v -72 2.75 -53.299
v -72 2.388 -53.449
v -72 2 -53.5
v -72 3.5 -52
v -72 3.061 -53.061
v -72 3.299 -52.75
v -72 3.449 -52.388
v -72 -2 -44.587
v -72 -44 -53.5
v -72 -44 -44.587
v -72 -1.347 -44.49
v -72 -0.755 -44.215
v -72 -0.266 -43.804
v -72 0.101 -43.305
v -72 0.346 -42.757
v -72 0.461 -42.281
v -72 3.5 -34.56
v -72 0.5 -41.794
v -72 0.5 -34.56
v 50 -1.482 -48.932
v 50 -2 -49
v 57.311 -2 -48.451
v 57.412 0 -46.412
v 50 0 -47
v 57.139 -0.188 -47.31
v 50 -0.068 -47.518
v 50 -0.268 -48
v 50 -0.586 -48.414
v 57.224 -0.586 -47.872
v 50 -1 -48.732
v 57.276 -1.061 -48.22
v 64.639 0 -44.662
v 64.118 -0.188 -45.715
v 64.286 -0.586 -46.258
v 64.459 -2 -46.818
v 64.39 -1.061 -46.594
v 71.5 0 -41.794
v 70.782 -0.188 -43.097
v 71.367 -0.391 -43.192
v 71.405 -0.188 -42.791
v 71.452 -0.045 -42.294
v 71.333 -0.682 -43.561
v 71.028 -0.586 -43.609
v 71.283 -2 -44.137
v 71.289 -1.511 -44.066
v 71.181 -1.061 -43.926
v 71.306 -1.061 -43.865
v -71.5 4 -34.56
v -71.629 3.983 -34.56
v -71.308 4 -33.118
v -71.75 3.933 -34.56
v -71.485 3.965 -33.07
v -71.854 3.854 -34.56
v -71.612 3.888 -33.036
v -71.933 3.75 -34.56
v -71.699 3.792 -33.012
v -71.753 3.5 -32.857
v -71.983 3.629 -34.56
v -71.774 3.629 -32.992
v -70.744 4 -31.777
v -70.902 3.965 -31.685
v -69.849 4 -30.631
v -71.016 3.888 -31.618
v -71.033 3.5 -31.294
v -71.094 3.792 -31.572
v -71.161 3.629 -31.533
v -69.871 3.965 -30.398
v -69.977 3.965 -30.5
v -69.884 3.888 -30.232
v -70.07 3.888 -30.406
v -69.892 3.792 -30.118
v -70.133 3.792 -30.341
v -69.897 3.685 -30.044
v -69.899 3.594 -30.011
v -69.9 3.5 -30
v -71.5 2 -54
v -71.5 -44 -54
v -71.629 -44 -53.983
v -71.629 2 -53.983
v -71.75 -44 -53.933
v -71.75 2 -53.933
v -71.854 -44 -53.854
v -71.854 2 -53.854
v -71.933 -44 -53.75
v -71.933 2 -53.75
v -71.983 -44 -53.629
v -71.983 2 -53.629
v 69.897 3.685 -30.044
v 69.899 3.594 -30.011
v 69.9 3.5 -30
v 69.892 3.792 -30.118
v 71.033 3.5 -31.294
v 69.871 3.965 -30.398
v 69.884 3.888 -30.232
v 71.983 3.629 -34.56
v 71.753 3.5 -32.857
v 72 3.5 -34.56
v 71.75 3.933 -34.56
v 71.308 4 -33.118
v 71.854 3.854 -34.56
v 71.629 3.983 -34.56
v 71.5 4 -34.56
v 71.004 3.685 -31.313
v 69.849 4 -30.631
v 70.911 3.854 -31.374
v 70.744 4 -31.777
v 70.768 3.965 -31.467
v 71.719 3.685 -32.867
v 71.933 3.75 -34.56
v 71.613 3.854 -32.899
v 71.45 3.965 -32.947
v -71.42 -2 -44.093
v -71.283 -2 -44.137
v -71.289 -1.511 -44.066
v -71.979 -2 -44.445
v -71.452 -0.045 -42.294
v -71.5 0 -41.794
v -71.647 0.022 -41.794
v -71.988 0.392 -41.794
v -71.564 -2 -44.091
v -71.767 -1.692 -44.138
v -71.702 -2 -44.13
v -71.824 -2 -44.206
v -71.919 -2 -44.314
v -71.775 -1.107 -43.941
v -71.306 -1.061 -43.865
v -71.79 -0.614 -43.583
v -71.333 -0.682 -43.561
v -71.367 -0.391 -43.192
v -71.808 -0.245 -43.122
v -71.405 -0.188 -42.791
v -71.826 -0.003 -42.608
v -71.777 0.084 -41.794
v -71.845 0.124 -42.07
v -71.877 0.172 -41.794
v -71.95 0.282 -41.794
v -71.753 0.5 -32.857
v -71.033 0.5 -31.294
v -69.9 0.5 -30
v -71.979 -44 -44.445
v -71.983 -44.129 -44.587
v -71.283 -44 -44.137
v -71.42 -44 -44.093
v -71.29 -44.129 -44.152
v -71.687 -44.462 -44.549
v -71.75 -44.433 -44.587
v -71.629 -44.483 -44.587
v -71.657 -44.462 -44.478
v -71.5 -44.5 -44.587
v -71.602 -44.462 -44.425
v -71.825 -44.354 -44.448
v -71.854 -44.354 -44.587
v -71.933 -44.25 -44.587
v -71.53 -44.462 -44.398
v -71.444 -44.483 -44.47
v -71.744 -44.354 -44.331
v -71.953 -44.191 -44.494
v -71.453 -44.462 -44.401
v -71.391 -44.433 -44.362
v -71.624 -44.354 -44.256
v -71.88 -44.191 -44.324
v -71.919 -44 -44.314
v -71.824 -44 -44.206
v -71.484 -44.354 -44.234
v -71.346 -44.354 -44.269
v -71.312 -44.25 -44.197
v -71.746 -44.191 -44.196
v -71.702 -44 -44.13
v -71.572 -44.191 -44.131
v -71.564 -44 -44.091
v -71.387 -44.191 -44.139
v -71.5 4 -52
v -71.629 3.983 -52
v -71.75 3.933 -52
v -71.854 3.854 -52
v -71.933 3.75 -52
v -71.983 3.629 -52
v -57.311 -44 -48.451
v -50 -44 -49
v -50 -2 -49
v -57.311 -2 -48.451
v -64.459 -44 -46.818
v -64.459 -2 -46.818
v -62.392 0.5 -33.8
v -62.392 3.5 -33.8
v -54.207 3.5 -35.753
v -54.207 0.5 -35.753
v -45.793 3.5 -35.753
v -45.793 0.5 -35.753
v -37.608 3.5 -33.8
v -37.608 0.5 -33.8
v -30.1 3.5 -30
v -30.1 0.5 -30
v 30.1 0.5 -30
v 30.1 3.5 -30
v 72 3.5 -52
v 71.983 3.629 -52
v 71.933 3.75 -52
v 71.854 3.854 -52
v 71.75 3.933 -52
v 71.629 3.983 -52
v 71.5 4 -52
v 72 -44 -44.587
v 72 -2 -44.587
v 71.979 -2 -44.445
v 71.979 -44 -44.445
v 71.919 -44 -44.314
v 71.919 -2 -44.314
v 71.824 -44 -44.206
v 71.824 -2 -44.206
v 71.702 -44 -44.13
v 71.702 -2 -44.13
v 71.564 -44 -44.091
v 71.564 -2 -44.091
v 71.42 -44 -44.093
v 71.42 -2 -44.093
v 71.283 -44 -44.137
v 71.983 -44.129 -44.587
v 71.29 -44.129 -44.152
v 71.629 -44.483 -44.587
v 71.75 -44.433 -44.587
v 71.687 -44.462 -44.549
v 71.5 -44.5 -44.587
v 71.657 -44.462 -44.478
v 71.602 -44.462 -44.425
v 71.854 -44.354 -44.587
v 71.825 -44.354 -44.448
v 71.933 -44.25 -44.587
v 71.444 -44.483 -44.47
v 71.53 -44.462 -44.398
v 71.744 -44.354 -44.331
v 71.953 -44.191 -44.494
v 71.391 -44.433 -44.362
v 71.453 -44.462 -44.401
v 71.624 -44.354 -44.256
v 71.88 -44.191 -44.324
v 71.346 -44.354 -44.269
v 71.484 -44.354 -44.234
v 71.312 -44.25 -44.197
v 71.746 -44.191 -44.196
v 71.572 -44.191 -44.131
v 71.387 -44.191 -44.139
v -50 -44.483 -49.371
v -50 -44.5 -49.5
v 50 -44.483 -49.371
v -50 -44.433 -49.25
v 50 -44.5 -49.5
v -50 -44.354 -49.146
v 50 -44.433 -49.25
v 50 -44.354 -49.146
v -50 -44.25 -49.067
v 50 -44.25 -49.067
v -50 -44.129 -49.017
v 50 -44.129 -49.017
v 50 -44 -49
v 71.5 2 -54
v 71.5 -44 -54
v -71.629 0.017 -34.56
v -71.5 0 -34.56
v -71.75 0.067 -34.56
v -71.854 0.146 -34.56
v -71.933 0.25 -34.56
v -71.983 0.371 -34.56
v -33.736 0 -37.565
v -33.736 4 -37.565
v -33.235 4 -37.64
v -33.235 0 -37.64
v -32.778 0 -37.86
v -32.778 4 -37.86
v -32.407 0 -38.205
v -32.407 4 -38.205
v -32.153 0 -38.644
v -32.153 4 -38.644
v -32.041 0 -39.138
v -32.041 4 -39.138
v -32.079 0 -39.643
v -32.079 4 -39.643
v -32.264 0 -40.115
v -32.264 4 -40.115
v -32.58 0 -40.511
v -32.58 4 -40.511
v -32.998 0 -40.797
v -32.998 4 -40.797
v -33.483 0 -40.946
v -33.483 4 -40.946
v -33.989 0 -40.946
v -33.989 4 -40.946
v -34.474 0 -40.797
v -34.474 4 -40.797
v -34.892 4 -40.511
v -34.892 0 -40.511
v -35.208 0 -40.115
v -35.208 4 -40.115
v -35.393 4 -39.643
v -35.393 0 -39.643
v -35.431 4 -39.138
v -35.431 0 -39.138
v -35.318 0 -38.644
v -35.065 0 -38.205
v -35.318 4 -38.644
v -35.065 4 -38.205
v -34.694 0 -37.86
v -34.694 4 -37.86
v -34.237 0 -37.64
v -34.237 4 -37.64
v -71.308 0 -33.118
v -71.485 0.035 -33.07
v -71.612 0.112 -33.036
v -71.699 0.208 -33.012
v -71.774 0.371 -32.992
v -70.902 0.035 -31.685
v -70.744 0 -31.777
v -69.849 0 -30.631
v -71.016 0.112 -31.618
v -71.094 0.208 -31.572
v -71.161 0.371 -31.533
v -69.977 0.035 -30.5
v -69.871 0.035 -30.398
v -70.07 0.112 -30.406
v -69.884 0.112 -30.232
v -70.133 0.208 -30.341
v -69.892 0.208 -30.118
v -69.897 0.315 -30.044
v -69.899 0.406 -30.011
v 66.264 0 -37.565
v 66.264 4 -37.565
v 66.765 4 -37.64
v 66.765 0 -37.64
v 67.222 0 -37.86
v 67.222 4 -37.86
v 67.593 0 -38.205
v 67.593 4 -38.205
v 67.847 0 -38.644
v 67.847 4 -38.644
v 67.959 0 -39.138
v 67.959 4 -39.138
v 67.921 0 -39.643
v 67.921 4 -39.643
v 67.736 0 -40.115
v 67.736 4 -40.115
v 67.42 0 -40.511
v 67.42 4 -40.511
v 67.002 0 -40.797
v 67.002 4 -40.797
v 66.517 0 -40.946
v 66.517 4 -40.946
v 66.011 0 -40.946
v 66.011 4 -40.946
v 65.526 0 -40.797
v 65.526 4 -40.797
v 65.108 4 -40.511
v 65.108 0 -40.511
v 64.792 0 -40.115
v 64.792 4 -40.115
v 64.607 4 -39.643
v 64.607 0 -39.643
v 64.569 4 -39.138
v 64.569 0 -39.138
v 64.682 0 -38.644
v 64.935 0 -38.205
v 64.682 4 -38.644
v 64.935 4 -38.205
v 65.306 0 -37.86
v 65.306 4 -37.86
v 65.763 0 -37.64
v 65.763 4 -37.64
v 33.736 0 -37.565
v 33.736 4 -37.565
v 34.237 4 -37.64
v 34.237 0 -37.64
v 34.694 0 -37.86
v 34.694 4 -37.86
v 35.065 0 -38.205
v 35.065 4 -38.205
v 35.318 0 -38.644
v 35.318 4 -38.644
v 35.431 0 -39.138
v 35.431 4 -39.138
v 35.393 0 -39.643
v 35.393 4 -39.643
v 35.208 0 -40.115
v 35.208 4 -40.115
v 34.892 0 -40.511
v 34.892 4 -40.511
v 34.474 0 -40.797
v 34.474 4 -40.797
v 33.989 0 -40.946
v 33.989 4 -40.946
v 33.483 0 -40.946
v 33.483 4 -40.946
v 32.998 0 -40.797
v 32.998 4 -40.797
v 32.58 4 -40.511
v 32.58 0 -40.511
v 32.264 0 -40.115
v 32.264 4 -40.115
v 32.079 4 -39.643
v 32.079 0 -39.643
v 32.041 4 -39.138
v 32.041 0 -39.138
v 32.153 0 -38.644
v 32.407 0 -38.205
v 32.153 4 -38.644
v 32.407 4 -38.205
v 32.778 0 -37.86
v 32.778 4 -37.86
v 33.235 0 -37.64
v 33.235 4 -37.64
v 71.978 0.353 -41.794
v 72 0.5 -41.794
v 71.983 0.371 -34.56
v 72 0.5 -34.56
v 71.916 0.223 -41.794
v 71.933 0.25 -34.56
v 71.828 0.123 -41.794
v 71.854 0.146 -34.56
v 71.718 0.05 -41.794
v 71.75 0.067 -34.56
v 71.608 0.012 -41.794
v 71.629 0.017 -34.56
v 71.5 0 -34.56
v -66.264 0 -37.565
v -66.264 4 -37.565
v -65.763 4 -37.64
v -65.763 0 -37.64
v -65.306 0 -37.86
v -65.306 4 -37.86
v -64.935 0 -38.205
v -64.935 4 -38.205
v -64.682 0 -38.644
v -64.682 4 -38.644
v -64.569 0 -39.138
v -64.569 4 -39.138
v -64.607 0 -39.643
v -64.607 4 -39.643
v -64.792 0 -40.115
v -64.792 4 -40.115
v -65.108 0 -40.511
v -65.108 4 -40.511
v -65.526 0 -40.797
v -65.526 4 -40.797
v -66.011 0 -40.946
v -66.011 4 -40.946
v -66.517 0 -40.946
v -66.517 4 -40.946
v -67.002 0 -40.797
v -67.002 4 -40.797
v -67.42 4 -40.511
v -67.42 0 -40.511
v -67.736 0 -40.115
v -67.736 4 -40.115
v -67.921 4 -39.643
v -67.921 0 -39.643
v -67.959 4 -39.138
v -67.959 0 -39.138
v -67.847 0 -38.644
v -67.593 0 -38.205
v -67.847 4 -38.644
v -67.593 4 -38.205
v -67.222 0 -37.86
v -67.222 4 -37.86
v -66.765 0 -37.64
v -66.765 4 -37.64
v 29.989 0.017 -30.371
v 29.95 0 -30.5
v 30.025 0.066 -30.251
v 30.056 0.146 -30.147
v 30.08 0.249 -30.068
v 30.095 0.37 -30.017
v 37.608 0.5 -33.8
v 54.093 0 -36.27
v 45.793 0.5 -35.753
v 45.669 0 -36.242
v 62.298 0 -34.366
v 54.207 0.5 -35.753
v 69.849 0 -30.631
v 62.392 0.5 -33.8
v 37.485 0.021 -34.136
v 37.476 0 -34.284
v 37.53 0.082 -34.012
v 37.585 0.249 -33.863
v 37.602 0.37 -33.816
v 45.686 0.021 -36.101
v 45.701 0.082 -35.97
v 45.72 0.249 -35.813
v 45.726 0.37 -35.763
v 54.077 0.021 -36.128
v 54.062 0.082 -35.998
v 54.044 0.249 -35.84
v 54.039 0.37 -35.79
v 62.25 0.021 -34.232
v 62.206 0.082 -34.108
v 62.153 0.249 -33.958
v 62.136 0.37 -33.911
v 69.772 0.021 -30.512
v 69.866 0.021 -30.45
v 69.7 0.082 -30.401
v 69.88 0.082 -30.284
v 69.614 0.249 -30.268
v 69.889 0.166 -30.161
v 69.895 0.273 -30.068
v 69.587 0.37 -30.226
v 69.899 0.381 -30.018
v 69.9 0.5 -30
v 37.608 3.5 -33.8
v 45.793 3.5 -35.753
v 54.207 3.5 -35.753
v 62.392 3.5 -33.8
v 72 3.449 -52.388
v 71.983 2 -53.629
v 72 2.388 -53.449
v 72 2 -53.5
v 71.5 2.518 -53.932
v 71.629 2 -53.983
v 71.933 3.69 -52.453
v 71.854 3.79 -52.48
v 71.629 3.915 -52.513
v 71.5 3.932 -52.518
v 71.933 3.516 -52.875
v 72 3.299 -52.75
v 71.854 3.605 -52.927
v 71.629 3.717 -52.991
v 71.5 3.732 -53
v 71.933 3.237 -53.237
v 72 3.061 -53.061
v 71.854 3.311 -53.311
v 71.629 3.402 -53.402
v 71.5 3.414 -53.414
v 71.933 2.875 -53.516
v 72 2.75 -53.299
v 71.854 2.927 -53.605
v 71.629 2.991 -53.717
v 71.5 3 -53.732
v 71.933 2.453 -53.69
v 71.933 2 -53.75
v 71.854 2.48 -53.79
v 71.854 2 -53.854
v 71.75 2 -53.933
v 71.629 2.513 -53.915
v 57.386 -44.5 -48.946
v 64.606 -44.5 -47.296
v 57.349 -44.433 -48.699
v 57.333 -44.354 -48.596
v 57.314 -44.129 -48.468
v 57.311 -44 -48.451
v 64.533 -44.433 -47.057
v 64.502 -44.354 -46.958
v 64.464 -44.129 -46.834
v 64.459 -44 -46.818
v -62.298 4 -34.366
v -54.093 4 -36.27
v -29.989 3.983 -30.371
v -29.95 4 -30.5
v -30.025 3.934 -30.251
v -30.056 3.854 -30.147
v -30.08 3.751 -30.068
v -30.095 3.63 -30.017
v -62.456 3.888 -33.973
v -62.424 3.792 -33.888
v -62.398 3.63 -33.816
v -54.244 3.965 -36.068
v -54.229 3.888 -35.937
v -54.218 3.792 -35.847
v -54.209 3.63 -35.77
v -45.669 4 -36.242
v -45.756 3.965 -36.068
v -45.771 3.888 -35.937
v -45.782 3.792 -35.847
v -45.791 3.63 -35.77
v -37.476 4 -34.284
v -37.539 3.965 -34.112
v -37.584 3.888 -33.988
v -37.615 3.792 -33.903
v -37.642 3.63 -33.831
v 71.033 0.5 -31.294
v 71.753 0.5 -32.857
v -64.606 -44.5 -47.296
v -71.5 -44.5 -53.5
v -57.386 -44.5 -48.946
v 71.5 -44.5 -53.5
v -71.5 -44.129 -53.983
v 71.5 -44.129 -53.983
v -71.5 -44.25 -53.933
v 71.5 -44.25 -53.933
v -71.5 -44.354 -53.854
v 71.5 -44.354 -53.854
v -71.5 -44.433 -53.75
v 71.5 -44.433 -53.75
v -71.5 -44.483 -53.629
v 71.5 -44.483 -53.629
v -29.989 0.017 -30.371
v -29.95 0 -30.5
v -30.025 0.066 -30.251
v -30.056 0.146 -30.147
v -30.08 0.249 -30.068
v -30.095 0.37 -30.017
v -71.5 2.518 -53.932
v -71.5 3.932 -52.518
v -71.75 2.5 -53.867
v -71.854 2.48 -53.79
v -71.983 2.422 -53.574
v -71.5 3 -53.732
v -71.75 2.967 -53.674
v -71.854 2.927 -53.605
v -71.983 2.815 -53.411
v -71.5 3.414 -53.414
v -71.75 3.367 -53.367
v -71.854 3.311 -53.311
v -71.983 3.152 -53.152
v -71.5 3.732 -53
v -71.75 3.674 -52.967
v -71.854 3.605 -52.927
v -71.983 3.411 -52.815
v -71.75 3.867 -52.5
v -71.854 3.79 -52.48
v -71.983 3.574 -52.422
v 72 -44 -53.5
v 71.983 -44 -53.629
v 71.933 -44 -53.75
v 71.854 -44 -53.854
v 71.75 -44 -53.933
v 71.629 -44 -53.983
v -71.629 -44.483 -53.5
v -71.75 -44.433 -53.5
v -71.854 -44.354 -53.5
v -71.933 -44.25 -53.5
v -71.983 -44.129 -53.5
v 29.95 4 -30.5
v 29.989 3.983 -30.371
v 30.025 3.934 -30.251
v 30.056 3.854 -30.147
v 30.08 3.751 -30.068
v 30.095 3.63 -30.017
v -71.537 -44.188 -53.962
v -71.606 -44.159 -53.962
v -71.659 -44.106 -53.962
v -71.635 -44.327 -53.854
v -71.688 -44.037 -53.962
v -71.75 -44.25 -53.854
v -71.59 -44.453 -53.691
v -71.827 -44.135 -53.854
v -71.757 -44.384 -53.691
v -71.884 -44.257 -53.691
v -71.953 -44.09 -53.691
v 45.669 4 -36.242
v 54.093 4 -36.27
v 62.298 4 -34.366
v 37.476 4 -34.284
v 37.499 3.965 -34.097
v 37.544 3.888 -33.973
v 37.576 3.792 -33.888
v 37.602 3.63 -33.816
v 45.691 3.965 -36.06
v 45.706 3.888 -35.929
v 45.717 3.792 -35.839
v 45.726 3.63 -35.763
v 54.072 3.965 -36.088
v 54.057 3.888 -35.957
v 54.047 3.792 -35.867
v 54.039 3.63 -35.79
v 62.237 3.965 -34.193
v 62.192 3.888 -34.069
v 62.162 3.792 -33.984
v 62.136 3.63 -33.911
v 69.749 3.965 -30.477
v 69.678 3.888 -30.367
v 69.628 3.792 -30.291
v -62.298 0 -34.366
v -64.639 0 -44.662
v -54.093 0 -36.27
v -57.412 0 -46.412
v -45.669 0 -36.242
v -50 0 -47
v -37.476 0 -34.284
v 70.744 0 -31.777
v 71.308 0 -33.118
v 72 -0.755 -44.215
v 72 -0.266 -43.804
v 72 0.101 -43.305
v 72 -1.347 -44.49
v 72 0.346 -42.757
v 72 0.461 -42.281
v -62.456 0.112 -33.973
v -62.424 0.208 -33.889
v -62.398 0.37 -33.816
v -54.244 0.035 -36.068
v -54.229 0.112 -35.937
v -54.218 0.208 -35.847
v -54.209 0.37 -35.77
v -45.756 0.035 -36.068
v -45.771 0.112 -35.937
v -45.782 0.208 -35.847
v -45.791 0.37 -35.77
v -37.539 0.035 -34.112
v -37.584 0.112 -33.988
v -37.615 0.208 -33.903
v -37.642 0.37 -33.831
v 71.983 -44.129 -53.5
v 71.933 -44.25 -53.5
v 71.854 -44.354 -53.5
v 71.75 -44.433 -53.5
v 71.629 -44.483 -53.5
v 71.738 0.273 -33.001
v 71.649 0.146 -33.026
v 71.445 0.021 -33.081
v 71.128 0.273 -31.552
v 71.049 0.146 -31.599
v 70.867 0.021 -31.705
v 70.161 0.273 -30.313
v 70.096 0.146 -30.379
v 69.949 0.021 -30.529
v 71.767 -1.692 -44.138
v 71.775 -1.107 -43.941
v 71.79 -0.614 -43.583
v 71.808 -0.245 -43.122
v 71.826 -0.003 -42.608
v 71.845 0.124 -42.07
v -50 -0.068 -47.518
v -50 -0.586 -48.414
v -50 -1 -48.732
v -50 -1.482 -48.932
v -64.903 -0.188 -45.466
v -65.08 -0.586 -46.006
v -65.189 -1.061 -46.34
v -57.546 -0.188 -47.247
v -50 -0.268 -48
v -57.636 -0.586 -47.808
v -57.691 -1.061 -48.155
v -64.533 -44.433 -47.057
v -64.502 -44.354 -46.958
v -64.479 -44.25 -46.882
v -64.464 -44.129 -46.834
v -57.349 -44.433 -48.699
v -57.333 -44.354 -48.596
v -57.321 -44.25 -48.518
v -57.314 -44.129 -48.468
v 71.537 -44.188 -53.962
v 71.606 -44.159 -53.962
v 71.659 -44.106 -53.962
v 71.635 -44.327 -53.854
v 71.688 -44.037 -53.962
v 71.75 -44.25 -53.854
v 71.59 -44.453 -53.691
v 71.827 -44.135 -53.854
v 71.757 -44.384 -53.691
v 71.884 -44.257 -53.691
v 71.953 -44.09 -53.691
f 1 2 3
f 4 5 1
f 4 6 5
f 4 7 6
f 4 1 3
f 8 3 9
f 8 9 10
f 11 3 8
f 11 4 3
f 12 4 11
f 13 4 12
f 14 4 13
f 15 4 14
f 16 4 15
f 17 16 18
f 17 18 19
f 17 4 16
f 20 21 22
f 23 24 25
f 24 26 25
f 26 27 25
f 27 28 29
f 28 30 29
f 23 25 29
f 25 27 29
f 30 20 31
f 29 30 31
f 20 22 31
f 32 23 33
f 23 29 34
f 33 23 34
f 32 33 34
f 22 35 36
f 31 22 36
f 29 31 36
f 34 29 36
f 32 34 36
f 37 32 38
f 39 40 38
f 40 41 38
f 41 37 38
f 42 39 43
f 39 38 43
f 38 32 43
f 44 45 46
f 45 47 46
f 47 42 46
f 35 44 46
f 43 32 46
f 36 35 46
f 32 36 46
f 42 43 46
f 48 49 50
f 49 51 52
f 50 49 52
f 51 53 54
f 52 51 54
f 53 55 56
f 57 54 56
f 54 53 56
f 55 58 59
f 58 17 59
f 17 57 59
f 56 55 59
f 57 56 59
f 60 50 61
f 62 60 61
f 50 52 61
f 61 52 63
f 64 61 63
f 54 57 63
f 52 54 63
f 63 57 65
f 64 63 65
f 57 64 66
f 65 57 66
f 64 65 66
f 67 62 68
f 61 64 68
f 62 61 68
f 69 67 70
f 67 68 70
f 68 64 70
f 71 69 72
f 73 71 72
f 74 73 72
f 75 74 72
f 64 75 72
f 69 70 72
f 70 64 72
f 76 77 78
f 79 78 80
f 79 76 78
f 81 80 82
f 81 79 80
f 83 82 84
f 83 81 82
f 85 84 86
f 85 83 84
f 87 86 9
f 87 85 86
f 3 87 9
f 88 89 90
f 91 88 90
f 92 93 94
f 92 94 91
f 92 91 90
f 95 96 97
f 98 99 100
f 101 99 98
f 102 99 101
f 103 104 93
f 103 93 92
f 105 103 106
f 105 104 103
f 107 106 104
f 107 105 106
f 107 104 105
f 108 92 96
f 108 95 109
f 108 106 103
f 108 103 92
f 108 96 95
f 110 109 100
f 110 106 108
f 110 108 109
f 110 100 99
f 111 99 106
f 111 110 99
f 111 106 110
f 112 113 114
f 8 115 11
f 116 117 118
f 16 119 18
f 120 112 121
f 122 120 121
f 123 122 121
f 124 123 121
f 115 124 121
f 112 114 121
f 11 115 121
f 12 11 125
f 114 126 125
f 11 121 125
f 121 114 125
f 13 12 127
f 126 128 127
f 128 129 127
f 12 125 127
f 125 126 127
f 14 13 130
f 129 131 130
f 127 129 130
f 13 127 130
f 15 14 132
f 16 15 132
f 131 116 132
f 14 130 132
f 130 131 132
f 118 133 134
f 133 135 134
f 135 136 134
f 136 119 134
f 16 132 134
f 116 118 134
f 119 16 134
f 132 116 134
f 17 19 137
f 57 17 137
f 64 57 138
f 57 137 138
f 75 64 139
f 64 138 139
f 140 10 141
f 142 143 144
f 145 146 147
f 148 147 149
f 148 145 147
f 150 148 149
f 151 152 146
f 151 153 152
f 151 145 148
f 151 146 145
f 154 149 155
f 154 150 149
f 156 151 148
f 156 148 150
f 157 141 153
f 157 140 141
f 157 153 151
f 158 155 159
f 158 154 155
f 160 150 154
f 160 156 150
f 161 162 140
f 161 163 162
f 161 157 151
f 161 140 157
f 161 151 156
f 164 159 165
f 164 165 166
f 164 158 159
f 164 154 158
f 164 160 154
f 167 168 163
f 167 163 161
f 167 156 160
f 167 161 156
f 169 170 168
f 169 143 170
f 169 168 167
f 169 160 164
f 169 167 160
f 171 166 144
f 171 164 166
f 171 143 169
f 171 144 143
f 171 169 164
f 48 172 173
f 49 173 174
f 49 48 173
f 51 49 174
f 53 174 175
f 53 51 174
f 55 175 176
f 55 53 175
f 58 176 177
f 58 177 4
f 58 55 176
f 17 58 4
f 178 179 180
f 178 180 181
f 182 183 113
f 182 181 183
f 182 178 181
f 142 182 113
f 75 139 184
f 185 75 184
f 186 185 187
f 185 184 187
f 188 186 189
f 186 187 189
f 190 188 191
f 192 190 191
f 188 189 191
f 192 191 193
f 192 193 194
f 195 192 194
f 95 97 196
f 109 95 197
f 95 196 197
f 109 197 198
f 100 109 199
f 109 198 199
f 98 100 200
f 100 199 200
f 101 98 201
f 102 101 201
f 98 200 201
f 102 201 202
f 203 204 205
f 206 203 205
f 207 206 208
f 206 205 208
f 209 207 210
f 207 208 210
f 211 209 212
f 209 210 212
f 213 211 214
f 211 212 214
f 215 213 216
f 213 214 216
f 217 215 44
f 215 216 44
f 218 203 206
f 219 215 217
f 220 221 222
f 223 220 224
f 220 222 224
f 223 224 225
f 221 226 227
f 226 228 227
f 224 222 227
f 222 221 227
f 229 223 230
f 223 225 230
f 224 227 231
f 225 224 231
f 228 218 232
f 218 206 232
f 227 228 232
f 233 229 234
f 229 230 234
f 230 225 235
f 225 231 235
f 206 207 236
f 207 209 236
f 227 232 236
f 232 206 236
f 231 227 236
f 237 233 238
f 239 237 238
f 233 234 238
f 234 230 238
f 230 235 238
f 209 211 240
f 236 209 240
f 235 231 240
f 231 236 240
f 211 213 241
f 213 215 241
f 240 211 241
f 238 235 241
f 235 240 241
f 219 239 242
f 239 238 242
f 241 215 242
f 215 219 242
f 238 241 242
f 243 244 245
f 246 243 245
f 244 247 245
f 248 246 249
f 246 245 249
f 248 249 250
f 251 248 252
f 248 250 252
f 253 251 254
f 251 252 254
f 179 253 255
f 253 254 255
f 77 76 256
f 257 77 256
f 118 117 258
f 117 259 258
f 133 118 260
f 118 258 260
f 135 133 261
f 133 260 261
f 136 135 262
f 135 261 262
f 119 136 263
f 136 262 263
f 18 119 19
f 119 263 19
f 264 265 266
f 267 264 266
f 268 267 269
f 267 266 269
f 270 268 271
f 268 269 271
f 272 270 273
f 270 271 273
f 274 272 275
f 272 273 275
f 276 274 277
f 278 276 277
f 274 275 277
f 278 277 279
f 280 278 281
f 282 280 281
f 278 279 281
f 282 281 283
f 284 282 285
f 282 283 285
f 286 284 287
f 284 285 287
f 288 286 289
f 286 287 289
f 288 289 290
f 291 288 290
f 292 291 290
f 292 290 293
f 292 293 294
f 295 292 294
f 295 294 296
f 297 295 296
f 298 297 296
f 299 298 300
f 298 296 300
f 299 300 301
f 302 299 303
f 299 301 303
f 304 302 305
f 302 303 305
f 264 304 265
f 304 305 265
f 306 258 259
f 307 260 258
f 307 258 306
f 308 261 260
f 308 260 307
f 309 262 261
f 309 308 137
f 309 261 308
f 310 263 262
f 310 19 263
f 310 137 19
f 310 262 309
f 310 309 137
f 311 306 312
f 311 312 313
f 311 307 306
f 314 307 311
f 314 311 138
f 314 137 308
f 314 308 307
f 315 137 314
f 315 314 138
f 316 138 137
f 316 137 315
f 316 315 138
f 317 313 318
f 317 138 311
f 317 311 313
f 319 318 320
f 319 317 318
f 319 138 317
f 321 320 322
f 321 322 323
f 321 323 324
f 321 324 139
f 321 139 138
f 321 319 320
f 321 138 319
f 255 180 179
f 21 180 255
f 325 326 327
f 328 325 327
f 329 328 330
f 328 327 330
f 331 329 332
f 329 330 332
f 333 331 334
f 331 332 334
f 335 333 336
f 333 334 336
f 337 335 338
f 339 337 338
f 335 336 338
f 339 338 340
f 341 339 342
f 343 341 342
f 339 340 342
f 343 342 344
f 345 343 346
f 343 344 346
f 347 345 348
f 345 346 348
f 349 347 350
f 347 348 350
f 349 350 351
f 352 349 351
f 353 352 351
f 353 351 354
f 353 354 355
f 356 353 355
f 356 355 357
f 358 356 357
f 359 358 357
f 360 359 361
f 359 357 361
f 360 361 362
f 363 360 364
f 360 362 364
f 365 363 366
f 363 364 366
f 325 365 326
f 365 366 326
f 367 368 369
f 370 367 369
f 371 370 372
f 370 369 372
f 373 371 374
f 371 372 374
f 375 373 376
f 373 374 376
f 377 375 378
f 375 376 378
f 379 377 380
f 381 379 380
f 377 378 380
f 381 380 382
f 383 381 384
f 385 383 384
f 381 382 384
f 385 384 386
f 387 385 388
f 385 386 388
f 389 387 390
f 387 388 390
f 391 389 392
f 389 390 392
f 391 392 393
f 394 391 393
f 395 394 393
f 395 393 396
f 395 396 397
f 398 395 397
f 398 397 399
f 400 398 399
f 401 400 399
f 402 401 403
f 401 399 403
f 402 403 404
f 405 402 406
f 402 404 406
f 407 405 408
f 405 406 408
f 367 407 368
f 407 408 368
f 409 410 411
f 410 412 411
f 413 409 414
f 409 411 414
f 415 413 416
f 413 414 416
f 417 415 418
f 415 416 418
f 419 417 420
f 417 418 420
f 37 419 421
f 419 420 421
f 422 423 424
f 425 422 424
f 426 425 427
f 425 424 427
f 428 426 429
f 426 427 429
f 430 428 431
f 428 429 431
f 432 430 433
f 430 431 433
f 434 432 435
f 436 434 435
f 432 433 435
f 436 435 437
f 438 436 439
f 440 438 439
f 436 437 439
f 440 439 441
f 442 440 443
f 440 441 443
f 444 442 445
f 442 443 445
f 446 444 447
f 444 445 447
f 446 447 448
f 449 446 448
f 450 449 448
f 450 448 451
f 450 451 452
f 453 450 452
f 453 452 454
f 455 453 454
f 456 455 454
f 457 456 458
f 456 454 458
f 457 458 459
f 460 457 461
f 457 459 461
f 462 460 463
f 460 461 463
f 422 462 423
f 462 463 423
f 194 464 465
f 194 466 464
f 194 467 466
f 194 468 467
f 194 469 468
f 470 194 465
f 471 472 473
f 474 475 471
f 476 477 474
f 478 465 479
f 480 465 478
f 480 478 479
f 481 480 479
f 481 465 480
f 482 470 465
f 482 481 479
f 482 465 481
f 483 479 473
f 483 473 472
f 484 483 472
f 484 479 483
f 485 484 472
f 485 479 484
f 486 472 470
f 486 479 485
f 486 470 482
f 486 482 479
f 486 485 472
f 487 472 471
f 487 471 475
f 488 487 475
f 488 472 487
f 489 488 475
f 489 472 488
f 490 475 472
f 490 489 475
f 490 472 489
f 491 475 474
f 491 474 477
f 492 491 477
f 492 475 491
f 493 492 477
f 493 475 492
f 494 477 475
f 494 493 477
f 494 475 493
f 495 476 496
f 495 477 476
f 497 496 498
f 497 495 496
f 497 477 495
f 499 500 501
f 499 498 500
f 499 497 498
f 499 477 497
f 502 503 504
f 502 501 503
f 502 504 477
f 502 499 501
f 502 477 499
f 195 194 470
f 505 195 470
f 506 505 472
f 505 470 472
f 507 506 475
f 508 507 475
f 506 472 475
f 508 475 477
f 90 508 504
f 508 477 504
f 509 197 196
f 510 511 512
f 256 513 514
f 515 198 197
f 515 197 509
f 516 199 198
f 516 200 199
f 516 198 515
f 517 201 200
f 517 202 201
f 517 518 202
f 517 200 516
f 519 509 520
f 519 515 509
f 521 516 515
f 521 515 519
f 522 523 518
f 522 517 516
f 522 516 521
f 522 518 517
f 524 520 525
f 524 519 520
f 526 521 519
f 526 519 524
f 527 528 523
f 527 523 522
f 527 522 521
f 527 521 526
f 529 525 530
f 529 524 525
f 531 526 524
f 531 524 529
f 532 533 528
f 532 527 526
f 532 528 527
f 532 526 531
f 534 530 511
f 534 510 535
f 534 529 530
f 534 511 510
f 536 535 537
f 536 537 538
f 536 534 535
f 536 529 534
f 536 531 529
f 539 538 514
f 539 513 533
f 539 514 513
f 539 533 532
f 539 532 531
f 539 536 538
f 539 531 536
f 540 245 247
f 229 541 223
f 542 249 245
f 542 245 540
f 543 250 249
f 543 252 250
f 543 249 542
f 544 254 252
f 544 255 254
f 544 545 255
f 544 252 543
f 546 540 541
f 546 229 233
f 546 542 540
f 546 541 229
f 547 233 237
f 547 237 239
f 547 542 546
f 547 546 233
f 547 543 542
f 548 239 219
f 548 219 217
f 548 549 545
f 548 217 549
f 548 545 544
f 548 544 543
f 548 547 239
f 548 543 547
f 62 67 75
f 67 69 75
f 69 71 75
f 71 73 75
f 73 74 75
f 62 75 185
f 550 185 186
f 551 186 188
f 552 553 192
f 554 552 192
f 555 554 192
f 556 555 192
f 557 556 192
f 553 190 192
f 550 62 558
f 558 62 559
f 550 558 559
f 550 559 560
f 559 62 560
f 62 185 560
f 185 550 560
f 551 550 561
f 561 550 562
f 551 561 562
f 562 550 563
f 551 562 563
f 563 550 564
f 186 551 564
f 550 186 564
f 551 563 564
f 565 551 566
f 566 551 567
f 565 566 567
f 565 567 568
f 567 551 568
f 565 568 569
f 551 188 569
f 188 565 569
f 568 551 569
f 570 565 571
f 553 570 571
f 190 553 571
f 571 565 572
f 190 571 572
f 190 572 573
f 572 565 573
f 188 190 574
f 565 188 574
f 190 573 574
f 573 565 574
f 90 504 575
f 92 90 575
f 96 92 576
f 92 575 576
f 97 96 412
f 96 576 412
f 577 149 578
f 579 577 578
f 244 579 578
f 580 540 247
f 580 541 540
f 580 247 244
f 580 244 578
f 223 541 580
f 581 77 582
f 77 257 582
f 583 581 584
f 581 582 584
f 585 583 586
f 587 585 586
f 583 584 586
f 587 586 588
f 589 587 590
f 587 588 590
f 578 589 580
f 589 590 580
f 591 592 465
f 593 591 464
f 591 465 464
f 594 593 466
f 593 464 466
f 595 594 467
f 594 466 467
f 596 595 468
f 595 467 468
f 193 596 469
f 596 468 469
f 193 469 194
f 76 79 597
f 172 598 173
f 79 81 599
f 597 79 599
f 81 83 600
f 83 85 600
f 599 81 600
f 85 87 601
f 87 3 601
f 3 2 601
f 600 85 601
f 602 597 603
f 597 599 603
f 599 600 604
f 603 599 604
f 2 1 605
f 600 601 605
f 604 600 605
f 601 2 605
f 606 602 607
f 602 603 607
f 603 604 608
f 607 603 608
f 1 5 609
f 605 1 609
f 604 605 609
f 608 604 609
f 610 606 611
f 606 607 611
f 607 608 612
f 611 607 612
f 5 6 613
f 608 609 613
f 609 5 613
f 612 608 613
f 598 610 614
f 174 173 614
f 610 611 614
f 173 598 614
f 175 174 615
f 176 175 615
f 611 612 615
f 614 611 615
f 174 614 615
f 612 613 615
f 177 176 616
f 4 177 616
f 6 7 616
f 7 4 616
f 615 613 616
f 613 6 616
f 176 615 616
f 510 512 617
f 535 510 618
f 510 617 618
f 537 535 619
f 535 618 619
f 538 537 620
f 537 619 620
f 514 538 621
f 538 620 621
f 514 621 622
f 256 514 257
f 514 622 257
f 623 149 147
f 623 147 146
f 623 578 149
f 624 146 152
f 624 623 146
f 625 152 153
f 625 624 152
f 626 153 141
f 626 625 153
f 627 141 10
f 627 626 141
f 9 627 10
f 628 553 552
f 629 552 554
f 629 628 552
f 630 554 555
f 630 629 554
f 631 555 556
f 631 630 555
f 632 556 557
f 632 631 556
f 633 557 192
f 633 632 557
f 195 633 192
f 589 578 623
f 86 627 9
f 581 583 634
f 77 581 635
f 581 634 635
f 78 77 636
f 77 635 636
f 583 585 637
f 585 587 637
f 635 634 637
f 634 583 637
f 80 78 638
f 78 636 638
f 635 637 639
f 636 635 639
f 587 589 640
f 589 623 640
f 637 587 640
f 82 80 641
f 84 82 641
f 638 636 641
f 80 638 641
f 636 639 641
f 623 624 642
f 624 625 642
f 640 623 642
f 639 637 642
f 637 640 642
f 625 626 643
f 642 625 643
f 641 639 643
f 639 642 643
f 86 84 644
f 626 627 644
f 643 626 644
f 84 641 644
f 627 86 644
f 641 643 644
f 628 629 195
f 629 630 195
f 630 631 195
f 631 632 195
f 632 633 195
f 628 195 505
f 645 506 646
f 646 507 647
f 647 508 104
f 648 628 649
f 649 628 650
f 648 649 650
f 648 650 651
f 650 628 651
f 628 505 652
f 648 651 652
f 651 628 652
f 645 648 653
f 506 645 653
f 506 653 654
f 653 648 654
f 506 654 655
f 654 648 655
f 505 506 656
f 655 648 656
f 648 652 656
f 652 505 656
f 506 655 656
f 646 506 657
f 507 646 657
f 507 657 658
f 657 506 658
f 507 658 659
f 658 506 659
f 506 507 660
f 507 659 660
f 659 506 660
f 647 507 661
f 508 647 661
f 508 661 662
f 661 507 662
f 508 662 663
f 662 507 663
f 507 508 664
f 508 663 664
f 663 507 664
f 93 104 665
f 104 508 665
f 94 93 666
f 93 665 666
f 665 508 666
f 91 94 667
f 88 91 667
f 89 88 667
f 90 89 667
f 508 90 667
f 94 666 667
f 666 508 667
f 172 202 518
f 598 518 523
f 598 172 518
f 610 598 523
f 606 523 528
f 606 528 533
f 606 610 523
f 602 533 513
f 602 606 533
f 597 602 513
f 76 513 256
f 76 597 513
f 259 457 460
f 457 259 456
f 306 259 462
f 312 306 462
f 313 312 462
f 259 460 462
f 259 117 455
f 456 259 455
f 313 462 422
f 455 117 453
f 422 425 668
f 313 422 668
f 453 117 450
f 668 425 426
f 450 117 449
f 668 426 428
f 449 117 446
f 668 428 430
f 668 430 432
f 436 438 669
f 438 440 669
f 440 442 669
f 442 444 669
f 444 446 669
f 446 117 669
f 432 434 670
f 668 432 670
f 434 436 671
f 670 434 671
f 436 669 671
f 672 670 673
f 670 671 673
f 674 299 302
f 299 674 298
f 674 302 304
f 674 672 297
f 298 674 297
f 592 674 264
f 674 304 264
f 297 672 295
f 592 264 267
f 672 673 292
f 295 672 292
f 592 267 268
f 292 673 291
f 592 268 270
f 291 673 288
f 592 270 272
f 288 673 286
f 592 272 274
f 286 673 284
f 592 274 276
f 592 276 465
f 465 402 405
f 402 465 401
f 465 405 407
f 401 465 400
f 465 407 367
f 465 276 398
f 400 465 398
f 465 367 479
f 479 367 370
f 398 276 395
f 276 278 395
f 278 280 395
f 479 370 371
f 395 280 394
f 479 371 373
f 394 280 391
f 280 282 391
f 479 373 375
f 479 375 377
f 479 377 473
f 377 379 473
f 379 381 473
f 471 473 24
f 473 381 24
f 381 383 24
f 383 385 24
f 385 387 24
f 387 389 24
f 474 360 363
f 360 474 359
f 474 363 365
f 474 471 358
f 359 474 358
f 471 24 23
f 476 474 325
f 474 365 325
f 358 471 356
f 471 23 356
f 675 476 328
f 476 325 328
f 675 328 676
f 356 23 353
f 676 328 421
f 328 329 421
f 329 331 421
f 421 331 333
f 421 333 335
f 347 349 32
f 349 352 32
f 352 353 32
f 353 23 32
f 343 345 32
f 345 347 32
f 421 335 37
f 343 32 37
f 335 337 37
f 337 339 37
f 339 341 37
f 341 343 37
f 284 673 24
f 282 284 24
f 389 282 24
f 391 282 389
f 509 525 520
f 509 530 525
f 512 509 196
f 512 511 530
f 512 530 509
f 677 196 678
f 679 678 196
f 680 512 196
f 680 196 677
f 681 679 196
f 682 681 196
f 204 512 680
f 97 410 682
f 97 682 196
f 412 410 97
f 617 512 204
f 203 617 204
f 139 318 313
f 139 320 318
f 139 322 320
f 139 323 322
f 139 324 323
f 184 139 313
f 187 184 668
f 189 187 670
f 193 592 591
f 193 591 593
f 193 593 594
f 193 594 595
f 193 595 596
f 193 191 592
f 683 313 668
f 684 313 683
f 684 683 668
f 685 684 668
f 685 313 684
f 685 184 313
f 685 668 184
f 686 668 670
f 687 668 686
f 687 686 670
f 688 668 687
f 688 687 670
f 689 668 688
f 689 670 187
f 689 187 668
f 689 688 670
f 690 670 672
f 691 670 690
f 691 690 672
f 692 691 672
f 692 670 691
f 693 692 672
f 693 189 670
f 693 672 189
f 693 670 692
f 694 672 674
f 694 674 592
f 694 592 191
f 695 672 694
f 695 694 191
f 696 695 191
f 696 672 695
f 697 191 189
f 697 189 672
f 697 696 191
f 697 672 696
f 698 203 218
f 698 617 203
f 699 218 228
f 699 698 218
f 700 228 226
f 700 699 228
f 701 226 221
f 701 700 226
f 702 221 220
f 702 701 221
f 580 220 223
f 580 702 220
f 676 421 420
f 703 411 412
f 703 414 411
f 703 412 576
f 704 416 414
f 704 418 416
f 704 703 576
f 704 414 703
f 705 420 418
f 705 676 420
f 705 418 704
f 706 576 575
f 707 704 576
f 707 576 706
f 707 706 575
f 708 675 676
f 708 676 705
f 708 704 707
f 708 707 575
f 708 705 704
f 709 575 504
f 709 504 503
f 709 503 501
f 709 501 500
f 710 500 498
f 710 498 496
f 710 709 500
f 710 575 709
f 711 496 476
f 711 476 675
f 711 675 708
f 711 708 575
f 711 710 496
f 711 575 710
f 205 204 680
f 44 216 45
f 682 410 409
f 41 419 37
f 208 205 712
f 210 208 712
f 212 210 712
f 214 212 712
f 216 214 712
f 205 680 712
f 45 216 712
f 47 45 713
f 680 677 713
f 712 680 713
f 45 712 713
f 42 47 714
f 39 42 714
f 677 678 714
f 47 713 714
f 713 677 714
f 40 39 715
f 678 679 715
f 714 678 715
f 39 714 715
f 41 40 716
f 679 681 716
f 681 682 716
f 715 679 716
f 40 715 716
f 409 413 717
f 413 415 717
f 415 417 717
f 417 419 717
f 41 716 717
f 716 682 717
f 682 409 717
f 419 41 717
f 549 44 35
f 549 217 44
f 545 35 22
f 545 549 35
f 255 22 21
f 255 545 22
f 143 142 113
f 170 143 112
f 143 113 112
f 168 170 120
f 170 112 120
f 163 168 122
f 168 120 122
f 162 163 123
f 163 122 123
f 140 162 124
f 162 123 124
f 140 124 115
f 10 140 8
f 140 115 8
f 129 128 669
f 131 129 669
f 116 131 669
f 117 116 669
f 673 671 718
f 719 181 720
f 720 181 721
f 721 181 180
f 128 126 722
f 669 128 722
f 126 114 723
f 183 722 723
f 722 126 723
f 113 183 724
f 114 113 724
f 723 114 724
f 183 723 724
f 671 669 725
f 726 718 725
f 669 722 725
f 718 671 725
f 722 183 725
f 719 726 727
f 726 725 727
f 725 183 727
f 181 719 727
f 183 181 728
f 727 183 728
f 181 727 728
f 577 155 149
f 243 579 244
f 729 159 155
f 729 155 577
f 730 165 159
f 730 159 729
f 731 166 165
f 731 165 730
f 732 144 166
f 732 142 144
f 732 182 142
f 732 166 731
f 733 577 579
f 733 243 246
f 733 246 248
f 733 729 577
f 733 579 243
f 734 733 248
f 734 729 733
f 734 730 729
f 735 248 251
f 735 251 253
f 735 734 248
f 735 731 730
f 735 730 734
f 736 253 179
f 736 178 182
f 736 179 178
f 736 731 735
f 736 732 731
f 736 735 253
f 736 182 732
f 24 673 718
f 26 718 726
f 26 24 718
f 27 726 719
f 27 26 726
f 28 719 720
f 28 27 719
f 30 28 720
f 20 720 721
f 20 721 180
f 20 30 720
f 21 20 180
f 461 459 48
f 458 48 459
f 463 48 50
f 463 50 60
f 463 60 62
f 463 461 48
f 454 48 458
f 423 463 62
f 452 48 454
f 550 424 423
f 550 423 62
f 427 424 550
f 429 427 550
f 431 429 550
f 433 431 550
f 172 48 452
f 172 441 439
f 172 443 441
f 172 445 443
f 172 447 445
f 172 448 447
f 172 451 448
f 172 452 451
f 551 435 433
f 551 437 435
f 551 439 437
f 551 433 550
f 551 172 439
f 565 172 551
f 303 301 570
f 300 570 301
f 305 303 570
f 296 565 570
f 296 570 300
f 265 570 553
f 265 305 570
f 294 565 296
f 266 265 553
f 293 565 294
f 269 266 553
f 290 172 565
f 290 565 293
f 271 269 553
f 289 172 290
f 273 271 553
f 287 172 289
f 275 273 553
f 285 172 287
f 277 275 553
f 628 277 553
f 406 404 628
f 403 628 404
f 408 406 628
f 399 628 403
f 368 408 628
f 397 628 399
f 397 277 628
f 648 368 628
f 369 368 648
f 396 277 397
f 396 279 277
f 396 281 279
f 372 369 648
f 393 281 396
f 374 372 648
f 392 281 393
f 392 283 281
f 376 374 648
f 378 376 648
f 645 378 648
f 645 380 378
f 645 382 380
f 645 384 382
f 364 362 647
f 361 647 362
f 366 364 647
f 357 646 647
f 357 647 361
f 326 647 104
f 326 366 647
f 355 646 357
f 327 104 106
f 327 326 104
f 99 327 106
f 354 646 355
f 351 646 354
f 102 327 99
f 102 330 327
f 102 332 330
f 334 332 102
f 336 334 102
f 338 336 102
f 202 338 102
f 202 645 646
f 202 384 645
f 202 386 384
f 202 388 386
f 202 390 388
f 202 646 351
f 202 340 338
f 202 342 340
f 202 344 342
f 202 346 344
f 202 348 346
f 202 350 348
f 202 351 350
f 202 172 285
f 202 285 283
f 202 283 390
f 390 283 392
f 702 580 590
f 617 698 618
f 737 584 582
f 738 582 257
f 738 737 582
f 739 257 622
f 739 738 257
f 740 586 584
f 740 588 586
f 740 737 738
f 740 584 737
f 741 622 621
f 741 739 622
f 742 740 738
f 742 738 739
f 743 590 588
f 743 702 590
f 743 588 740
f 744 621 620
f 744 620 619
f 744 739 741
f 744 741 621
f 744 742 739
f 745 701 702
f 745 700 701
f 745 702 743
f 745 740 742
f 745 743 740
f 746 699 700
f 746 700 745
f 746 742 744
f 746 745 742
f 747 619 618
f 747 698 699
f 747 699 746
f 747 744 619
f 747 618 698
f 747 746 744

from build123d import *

# Parameters (mm, degrees)
BOSS_EXTRUDE1_DEPTH = 4
SKETCH3_W           = 144
SKETCH3_H           = 5
BOSS_EXTRUDE2_DEPTH = 44.5
SKETCH5_R           = 1.7
CUT_EXTRUDE1_DEPTH  = 4
BOSS_EXTRUDE3_DEPTH = 44.5
FILLET1_R           = 2
FILLET2_R           = 6
FILLET3_R           = 0.5


with BuildPart() as part:
    # Sketch2 → Boss-Extrude1 (new body)
    with BuildSketch(Plane(origin=(0, 0, 0), x_dir=(1, 0, 0), z_dir=(0, 1, 0))):
        with BuildLine():
            Line((72, 30), (72, 54))
            Line((72, 54), (-72, 54))
            Line((-72, 54), (-72, 30))
            Line((-72, 30), (-69.899748742, 30))
            ThreePointArc((-69.899748742, 30), (-50, 36), (-30.100251258, 30))
            Line((-30.100251258, 30), (30.100251258, 30))
            ThreePointArc((30.100251258, 30), (50, 36), (69.899748742, 30))
            Line((69.899748742, 30), (72, 30))
        make_face()
    extrude(amount=BOSS_EXTRUDE1_DEPTH)

    # Sketch3 → Boss-Extrude2 (add)
    with BuildSketch(Plane.XZ):
        with Locations((0, -51.5)):
            Rectangle(SKETCH3_W, SKETCH3_H)
    extrude(amount=BOSS_EXTRUDE2_DEPTH)

    # Sketch5 → Cut-Extrude1 (cut)
    with BuildSketch(Plane(origin=(0, 4, 0), x_dir=(1, 0, 0), z_dir=(0, 1, 0))):
        with Locations(Location((-66.264045876, 39.264880132, 0), (0, 0, 270))):
            Circle(SKETCH5_R)
        with Locations(Location((-33.735954124, 39.264880132, 0), (0, 0, 270))):
            Circle(SKETCH5_R)
        with Locations(Location((33.735954124, 39.264880132, 0), (0, 0, 270))):
            Circle(SKETCH5_R)
        with Locations(Location((66.264045876, 39.264880132, 0), (0, 0, 270))):
            Circle(SKETCH5_R)
    extrude(amount=-CUT_EXTRUDE1_DEPTH, mode=Mode.SUBTRACT)

    # Sketch6 → Boss-Extrude3 (add)
    with BuildSketch(Plane.XZ.offset(44.5)):
        with BuildLine():
            Line((72, -49), (72, -43.783558558))
            ThreePointArc((72, -43.783558558), (61.304990727, -47.678057686), (50, -49))
            Line((50, -49), (72, -49))
        make_face()
        with BuildLine():
            Line((-72, -49), (-50, -49))
            ThreePointArc((-50, -49), (-61.304990727, -47.678057686), (-72, -43.783558558))
            Line((-72, -43.783558558), (-72, -49))
        make_face()
    extrude(amount=-BOSS_EXTRUDE3_DEPTH)

    # Fillet1
    fillet1_edges = [part.edges().sort_by_distance(p)[0] for p in [
        (0, 4, -54),
        (0, 0, -49),
        (61.304990727, 0, -47.678057686),
        (-61.304990727, 0, -47.678057686),
    ]]
    fillet(fillet1_edges, radius=FILLET1_R)

    # Fillet2
    # the kernel refuses this fillet: 6 mm, written as the material it takes off along each edge
    with BuildSketch(Plane(origin=(-72, -11.399550361, -30), x_dir=(0, 0, -1), z_dir=(0, 1, 0))) as fillet2_piece_1:
        with BuildLine():
            CenterArc((4.559820144, -6), FILLET2_R, 90, 49.461555346)
            Line((0, -2.100251258), (-0.091196403, -2.022256283))
            ThreePointArc((-0.091196403, -2.022256283), (-0.12, -1.050125629), (-0.12, 0))
            Line((-0.12, 0), (0, 0.12))
            Line((0, 0.12), (4.559820144, 0.12))
            Line((4.559820144, 0.12), (4.559820144, 0))
        make_face()
    extrude(amount=26.799100721, mode=Mode.SUBTRACT)
    with BuildSketch(Plane(origin=(72, -11.399550361, -30), x_dir=(0, 0, -1), z_dir=(0, 1, 0))) as fillet2_piece_2:
        with BuildLine():
            CenterArc((4.559820144, 6), FILLET2_R, 220.538444654, 49.461555346)
            Line((0, 2.100251258), (-0.091196403, 2.022256283))
            ThreePointArc((-0.091196403, 2.022256283), (-0.12, 1.050125629), (-0.12, 0))
            Line((-0.12, 0), (0, -0.12))
            Line((0, -0.12), (4.559820144, -0.12))
            Line((4.559820144, -0.12), (4.559820144, 0))
        make_face()
    extrude(amount=26.799100721, mode=Mode.SUBTRACT)

    # Fillet3
    fillet3_edges = [part.edges().sort_by_distance(p)[0] for p in [
        (-50, 0, -36),
        (-50, 4, -36),
        (0, 4, -30),
        (50, 4, -36),
        (72, -44.5, -48.891779279),
        (-72, -44.5, -48.891779279),
        (0, -44.5, -54),
        (0, -44.5, -49),
        (61.304990727, -44.5, -47.678057686),
        (-61.304990727, -44.5, -47.678057686),
        (-72, 0, -38.046469729),
        (72, -23.25, -43.783558558),
        (-72, -23.25, -43.783558558),
        (-72, 4, -43.279910072),
        (-72, -21.25, -54),
        (-72, 3.414213562, -53.414213562),
        (72, -21.25, -54),
        (72, 3.414213562, -53.414213562),
        (72, -0.543612491, -43.078170154),
        (-72, -0.543612491, -43.078170154),
        (50, 0, -36),
        (72, 0, -38.046469729),
        (71.44970148, 0, -32.049689914),
        (-71.44970148, 0, -32.049689914),
        (0, 0, -30),
        (72, 4, -43.279910072),
        (71.44970148, 4, -32.049689914),
        (-71.44970148, 4, -32.049689914),
    ]]
    fillet(fillet3_edges, radius=FILLET3_R)


solid = part.part
